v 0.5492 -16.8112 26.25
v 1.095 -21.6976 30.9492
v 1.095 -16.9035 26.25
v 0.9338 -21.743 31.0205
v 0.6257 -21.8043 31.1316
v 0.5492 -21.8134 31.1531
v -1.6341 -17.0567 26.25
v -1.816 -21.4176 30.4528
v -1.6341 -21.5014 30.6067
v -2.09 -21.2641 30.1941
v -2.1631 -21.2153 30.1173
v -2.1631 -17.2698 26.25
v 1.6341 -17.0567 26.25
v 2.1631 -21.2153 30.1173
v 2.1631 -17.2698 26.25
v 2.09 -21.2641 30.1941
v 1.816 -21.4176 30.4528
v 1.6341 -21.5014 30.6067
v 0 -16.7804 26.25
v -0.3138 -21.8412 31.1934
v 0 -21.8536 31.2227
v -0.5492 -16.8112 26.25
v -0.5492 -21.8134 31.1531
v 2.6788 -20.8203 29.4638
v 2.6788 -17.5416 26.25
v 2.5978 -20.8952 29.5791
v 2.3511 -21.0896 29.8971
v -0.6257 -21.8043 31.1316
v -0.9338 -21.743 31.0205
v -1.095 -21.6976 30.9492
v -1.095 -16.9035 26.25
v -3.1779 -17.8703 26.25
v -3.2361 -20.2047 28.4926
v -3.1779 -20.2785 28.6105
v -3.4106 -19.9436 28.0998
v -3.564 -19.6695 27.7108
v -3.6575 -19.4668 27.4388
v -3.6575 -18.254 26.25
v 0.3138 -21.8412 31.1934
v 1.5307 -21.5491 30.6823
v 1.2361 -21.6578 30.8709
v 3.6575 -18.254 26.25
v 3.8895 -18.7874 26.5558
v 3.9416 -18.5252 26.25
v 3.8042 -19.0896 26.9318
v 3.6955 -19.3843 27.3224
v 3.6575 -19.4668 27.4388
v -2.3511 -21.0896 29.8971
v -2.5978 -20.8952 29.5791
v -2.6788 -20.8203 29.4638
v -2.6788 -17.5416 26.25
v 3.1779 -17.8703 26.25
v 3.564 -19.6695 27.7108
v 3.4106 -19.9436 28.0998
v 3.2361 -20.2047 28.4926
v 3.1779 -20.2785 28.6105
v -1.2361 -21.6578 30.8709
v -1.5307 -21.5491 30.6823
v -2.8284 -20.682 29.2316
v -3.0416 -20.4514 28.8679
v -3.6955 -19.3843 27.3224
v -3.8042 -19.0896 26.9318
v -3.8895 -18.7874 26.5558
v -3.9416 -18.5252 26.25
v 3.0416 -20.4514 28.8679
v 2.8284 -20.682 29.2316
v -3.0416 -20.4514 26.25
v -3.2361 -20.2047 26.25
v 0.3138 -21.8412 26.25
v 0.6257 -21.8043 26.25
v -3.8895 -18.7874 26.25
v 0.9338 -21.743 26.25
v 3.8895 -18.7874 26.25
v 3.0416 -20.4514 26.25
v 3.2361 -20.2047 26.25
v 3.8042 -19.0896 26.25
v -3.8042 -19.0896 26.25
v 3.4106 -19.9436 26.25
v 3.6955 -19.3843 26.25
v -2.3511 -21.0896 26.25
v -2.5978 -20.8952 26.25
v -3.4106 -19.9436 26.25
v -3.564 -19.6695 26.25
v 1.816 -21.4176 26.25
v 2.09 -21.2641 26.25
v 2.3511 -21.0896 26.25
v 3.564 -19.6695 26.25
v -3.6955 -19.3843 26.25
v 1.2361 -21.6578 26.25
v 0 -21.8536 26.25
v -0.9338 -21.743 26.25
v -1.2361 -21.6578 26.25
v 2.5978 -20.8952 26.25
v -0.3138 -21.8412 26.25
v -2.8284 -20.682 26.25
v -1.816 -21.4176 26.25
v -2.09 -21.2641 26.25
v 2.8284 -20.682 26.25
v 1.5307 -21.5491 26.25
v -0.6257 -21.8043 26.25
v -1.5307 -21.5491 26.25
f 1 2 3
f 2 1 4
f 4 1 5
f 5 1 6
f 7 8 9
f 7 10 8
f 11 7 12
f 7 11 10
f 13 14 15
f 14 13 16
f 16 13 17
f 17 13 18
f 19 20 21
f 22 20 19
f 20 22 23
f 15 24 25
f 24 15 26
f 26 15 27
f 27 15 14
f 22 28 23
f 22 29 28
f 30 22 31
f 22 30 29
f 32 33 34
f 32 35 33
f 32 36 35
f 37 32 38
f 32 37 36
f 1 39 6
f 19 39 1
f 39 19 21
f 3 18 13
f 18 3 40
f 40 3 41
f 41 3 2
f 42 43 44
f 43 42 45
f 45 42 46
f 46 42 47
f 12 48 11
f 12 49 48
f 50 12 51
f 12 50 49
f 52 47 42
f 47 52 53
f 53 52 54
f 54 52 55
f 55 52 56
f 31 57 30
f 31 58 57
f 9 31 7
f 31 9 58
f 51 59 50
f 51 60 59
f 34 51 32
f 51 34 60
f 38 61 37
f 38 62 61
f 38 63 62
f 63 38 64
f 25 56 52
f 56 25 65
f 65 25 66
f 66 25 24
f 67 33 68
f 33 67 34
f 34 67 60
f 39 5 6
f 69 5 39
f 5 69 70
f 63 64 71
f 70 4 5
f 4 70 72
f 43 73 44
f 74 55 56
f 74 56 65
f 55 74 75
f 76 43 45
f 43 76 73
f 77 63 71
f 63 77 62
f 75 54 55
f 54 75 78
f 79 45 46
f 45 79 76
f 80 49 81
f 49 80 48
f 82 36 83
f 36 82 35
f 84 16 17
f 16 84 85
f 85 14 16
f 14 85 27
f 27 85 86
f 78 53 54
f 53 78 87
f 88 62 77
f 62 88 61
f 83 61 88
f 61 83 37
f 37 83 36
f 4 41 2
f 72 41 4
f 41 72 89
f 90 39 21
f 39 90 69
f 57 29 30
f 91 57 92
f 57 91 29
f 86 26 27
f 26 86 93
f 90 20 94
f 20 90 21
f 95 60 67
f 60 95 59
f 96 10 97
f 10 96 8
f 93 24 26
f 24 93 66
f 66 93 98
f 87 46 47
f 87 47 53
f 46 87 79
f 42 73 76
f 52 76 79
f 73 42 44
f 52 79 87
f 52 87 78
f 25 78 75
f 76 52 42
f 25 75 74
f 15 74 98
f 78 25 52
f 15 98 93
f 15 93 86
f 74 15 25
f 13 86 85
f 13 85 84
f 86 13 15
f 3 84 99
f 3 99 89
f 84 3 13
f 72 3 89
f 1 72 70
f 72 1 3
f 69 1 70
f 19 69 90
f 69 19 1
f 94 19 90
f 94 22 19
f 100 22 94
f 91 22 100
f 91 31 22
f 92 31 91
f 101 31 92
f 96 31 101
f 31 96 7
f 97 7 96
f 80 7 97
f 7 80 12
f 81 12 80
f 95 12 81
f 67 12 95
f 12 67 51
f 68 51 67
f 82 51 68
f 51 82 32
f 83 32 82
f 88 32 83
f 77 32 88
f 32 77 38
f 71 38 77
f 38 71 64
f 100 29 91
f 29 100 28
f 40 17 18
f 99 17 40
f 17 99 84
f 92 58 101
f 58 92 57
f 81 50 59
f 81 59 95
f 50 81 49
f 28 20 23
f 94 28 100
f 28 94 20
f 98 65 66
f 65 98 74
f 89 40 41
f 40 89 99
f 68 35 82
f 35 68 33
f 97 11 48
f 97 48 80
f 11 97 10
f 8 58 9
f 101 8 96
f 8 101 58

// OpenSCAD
// lid_holder.scad
// Customizable lid holder for 3D printing
// Parameters:
//   length:      Total length of the holder (default: 60)
//   tip_height:  Height of the tip (adjust to lid thickness, default: 40)
//   R:           Radius of the holder (default: 10)
//   outer_radius: Radius of the support hole (default: 5)
//   inner_radius: Radius of the screw hole (default: 2.5)

// Lid holder length
length = 50;

// Height of the tip of the holder, to adjust to lid thickness
tip_height = 35;

// Radius of the holder
R = 7;

// Fixature geometry
outer_radius = 4;
inner_radius = 2.5; // The screw must fit in

angle = acos(tip_height / length);
base_length = sqrt(length^2 - tip_height^2);

$fn = 80;

module body(){            
    // Tilt the cylinder to reach the desired tip height
    rotate(a = angle, v = [1, 0, 0])
        union() {
            // Main cylinder with rounded edges
            cylinder(h = length, r = R);
            sphere(r = R);
            translate(v = [0, 0, length]) sphere(r = R);
        }
}

module support(){
    difference() {
        union() {
            difference() {
                body();
                // Hole for the support
                translate(v = [0, -base_length/2, 0])
                    cylinder(h = tip_height + R, r = outer_radius);
            }
            // Merge with the support
            translate(v = [0, -base_length/2, 0])
                difference() {
                    // Support base
                    cylinder(h = tip_height/2, r = R);
                    // Screw hole
                    cylinder(h = tip_height/2, r = inner_radius);
                }
        }

        // Remove the z<0 region
        translate(v = [-base_length, -base_length, -2*base_length])
            cube(size = 2 * base_length);
    }
}

module cap(){
    intersection() {
        translate(v = [0, -base_length/2, tip_height*.75])
            cylinder(h = tip_height + R, r = outer_radius);
        body();
    }
}

//support();
cap();
